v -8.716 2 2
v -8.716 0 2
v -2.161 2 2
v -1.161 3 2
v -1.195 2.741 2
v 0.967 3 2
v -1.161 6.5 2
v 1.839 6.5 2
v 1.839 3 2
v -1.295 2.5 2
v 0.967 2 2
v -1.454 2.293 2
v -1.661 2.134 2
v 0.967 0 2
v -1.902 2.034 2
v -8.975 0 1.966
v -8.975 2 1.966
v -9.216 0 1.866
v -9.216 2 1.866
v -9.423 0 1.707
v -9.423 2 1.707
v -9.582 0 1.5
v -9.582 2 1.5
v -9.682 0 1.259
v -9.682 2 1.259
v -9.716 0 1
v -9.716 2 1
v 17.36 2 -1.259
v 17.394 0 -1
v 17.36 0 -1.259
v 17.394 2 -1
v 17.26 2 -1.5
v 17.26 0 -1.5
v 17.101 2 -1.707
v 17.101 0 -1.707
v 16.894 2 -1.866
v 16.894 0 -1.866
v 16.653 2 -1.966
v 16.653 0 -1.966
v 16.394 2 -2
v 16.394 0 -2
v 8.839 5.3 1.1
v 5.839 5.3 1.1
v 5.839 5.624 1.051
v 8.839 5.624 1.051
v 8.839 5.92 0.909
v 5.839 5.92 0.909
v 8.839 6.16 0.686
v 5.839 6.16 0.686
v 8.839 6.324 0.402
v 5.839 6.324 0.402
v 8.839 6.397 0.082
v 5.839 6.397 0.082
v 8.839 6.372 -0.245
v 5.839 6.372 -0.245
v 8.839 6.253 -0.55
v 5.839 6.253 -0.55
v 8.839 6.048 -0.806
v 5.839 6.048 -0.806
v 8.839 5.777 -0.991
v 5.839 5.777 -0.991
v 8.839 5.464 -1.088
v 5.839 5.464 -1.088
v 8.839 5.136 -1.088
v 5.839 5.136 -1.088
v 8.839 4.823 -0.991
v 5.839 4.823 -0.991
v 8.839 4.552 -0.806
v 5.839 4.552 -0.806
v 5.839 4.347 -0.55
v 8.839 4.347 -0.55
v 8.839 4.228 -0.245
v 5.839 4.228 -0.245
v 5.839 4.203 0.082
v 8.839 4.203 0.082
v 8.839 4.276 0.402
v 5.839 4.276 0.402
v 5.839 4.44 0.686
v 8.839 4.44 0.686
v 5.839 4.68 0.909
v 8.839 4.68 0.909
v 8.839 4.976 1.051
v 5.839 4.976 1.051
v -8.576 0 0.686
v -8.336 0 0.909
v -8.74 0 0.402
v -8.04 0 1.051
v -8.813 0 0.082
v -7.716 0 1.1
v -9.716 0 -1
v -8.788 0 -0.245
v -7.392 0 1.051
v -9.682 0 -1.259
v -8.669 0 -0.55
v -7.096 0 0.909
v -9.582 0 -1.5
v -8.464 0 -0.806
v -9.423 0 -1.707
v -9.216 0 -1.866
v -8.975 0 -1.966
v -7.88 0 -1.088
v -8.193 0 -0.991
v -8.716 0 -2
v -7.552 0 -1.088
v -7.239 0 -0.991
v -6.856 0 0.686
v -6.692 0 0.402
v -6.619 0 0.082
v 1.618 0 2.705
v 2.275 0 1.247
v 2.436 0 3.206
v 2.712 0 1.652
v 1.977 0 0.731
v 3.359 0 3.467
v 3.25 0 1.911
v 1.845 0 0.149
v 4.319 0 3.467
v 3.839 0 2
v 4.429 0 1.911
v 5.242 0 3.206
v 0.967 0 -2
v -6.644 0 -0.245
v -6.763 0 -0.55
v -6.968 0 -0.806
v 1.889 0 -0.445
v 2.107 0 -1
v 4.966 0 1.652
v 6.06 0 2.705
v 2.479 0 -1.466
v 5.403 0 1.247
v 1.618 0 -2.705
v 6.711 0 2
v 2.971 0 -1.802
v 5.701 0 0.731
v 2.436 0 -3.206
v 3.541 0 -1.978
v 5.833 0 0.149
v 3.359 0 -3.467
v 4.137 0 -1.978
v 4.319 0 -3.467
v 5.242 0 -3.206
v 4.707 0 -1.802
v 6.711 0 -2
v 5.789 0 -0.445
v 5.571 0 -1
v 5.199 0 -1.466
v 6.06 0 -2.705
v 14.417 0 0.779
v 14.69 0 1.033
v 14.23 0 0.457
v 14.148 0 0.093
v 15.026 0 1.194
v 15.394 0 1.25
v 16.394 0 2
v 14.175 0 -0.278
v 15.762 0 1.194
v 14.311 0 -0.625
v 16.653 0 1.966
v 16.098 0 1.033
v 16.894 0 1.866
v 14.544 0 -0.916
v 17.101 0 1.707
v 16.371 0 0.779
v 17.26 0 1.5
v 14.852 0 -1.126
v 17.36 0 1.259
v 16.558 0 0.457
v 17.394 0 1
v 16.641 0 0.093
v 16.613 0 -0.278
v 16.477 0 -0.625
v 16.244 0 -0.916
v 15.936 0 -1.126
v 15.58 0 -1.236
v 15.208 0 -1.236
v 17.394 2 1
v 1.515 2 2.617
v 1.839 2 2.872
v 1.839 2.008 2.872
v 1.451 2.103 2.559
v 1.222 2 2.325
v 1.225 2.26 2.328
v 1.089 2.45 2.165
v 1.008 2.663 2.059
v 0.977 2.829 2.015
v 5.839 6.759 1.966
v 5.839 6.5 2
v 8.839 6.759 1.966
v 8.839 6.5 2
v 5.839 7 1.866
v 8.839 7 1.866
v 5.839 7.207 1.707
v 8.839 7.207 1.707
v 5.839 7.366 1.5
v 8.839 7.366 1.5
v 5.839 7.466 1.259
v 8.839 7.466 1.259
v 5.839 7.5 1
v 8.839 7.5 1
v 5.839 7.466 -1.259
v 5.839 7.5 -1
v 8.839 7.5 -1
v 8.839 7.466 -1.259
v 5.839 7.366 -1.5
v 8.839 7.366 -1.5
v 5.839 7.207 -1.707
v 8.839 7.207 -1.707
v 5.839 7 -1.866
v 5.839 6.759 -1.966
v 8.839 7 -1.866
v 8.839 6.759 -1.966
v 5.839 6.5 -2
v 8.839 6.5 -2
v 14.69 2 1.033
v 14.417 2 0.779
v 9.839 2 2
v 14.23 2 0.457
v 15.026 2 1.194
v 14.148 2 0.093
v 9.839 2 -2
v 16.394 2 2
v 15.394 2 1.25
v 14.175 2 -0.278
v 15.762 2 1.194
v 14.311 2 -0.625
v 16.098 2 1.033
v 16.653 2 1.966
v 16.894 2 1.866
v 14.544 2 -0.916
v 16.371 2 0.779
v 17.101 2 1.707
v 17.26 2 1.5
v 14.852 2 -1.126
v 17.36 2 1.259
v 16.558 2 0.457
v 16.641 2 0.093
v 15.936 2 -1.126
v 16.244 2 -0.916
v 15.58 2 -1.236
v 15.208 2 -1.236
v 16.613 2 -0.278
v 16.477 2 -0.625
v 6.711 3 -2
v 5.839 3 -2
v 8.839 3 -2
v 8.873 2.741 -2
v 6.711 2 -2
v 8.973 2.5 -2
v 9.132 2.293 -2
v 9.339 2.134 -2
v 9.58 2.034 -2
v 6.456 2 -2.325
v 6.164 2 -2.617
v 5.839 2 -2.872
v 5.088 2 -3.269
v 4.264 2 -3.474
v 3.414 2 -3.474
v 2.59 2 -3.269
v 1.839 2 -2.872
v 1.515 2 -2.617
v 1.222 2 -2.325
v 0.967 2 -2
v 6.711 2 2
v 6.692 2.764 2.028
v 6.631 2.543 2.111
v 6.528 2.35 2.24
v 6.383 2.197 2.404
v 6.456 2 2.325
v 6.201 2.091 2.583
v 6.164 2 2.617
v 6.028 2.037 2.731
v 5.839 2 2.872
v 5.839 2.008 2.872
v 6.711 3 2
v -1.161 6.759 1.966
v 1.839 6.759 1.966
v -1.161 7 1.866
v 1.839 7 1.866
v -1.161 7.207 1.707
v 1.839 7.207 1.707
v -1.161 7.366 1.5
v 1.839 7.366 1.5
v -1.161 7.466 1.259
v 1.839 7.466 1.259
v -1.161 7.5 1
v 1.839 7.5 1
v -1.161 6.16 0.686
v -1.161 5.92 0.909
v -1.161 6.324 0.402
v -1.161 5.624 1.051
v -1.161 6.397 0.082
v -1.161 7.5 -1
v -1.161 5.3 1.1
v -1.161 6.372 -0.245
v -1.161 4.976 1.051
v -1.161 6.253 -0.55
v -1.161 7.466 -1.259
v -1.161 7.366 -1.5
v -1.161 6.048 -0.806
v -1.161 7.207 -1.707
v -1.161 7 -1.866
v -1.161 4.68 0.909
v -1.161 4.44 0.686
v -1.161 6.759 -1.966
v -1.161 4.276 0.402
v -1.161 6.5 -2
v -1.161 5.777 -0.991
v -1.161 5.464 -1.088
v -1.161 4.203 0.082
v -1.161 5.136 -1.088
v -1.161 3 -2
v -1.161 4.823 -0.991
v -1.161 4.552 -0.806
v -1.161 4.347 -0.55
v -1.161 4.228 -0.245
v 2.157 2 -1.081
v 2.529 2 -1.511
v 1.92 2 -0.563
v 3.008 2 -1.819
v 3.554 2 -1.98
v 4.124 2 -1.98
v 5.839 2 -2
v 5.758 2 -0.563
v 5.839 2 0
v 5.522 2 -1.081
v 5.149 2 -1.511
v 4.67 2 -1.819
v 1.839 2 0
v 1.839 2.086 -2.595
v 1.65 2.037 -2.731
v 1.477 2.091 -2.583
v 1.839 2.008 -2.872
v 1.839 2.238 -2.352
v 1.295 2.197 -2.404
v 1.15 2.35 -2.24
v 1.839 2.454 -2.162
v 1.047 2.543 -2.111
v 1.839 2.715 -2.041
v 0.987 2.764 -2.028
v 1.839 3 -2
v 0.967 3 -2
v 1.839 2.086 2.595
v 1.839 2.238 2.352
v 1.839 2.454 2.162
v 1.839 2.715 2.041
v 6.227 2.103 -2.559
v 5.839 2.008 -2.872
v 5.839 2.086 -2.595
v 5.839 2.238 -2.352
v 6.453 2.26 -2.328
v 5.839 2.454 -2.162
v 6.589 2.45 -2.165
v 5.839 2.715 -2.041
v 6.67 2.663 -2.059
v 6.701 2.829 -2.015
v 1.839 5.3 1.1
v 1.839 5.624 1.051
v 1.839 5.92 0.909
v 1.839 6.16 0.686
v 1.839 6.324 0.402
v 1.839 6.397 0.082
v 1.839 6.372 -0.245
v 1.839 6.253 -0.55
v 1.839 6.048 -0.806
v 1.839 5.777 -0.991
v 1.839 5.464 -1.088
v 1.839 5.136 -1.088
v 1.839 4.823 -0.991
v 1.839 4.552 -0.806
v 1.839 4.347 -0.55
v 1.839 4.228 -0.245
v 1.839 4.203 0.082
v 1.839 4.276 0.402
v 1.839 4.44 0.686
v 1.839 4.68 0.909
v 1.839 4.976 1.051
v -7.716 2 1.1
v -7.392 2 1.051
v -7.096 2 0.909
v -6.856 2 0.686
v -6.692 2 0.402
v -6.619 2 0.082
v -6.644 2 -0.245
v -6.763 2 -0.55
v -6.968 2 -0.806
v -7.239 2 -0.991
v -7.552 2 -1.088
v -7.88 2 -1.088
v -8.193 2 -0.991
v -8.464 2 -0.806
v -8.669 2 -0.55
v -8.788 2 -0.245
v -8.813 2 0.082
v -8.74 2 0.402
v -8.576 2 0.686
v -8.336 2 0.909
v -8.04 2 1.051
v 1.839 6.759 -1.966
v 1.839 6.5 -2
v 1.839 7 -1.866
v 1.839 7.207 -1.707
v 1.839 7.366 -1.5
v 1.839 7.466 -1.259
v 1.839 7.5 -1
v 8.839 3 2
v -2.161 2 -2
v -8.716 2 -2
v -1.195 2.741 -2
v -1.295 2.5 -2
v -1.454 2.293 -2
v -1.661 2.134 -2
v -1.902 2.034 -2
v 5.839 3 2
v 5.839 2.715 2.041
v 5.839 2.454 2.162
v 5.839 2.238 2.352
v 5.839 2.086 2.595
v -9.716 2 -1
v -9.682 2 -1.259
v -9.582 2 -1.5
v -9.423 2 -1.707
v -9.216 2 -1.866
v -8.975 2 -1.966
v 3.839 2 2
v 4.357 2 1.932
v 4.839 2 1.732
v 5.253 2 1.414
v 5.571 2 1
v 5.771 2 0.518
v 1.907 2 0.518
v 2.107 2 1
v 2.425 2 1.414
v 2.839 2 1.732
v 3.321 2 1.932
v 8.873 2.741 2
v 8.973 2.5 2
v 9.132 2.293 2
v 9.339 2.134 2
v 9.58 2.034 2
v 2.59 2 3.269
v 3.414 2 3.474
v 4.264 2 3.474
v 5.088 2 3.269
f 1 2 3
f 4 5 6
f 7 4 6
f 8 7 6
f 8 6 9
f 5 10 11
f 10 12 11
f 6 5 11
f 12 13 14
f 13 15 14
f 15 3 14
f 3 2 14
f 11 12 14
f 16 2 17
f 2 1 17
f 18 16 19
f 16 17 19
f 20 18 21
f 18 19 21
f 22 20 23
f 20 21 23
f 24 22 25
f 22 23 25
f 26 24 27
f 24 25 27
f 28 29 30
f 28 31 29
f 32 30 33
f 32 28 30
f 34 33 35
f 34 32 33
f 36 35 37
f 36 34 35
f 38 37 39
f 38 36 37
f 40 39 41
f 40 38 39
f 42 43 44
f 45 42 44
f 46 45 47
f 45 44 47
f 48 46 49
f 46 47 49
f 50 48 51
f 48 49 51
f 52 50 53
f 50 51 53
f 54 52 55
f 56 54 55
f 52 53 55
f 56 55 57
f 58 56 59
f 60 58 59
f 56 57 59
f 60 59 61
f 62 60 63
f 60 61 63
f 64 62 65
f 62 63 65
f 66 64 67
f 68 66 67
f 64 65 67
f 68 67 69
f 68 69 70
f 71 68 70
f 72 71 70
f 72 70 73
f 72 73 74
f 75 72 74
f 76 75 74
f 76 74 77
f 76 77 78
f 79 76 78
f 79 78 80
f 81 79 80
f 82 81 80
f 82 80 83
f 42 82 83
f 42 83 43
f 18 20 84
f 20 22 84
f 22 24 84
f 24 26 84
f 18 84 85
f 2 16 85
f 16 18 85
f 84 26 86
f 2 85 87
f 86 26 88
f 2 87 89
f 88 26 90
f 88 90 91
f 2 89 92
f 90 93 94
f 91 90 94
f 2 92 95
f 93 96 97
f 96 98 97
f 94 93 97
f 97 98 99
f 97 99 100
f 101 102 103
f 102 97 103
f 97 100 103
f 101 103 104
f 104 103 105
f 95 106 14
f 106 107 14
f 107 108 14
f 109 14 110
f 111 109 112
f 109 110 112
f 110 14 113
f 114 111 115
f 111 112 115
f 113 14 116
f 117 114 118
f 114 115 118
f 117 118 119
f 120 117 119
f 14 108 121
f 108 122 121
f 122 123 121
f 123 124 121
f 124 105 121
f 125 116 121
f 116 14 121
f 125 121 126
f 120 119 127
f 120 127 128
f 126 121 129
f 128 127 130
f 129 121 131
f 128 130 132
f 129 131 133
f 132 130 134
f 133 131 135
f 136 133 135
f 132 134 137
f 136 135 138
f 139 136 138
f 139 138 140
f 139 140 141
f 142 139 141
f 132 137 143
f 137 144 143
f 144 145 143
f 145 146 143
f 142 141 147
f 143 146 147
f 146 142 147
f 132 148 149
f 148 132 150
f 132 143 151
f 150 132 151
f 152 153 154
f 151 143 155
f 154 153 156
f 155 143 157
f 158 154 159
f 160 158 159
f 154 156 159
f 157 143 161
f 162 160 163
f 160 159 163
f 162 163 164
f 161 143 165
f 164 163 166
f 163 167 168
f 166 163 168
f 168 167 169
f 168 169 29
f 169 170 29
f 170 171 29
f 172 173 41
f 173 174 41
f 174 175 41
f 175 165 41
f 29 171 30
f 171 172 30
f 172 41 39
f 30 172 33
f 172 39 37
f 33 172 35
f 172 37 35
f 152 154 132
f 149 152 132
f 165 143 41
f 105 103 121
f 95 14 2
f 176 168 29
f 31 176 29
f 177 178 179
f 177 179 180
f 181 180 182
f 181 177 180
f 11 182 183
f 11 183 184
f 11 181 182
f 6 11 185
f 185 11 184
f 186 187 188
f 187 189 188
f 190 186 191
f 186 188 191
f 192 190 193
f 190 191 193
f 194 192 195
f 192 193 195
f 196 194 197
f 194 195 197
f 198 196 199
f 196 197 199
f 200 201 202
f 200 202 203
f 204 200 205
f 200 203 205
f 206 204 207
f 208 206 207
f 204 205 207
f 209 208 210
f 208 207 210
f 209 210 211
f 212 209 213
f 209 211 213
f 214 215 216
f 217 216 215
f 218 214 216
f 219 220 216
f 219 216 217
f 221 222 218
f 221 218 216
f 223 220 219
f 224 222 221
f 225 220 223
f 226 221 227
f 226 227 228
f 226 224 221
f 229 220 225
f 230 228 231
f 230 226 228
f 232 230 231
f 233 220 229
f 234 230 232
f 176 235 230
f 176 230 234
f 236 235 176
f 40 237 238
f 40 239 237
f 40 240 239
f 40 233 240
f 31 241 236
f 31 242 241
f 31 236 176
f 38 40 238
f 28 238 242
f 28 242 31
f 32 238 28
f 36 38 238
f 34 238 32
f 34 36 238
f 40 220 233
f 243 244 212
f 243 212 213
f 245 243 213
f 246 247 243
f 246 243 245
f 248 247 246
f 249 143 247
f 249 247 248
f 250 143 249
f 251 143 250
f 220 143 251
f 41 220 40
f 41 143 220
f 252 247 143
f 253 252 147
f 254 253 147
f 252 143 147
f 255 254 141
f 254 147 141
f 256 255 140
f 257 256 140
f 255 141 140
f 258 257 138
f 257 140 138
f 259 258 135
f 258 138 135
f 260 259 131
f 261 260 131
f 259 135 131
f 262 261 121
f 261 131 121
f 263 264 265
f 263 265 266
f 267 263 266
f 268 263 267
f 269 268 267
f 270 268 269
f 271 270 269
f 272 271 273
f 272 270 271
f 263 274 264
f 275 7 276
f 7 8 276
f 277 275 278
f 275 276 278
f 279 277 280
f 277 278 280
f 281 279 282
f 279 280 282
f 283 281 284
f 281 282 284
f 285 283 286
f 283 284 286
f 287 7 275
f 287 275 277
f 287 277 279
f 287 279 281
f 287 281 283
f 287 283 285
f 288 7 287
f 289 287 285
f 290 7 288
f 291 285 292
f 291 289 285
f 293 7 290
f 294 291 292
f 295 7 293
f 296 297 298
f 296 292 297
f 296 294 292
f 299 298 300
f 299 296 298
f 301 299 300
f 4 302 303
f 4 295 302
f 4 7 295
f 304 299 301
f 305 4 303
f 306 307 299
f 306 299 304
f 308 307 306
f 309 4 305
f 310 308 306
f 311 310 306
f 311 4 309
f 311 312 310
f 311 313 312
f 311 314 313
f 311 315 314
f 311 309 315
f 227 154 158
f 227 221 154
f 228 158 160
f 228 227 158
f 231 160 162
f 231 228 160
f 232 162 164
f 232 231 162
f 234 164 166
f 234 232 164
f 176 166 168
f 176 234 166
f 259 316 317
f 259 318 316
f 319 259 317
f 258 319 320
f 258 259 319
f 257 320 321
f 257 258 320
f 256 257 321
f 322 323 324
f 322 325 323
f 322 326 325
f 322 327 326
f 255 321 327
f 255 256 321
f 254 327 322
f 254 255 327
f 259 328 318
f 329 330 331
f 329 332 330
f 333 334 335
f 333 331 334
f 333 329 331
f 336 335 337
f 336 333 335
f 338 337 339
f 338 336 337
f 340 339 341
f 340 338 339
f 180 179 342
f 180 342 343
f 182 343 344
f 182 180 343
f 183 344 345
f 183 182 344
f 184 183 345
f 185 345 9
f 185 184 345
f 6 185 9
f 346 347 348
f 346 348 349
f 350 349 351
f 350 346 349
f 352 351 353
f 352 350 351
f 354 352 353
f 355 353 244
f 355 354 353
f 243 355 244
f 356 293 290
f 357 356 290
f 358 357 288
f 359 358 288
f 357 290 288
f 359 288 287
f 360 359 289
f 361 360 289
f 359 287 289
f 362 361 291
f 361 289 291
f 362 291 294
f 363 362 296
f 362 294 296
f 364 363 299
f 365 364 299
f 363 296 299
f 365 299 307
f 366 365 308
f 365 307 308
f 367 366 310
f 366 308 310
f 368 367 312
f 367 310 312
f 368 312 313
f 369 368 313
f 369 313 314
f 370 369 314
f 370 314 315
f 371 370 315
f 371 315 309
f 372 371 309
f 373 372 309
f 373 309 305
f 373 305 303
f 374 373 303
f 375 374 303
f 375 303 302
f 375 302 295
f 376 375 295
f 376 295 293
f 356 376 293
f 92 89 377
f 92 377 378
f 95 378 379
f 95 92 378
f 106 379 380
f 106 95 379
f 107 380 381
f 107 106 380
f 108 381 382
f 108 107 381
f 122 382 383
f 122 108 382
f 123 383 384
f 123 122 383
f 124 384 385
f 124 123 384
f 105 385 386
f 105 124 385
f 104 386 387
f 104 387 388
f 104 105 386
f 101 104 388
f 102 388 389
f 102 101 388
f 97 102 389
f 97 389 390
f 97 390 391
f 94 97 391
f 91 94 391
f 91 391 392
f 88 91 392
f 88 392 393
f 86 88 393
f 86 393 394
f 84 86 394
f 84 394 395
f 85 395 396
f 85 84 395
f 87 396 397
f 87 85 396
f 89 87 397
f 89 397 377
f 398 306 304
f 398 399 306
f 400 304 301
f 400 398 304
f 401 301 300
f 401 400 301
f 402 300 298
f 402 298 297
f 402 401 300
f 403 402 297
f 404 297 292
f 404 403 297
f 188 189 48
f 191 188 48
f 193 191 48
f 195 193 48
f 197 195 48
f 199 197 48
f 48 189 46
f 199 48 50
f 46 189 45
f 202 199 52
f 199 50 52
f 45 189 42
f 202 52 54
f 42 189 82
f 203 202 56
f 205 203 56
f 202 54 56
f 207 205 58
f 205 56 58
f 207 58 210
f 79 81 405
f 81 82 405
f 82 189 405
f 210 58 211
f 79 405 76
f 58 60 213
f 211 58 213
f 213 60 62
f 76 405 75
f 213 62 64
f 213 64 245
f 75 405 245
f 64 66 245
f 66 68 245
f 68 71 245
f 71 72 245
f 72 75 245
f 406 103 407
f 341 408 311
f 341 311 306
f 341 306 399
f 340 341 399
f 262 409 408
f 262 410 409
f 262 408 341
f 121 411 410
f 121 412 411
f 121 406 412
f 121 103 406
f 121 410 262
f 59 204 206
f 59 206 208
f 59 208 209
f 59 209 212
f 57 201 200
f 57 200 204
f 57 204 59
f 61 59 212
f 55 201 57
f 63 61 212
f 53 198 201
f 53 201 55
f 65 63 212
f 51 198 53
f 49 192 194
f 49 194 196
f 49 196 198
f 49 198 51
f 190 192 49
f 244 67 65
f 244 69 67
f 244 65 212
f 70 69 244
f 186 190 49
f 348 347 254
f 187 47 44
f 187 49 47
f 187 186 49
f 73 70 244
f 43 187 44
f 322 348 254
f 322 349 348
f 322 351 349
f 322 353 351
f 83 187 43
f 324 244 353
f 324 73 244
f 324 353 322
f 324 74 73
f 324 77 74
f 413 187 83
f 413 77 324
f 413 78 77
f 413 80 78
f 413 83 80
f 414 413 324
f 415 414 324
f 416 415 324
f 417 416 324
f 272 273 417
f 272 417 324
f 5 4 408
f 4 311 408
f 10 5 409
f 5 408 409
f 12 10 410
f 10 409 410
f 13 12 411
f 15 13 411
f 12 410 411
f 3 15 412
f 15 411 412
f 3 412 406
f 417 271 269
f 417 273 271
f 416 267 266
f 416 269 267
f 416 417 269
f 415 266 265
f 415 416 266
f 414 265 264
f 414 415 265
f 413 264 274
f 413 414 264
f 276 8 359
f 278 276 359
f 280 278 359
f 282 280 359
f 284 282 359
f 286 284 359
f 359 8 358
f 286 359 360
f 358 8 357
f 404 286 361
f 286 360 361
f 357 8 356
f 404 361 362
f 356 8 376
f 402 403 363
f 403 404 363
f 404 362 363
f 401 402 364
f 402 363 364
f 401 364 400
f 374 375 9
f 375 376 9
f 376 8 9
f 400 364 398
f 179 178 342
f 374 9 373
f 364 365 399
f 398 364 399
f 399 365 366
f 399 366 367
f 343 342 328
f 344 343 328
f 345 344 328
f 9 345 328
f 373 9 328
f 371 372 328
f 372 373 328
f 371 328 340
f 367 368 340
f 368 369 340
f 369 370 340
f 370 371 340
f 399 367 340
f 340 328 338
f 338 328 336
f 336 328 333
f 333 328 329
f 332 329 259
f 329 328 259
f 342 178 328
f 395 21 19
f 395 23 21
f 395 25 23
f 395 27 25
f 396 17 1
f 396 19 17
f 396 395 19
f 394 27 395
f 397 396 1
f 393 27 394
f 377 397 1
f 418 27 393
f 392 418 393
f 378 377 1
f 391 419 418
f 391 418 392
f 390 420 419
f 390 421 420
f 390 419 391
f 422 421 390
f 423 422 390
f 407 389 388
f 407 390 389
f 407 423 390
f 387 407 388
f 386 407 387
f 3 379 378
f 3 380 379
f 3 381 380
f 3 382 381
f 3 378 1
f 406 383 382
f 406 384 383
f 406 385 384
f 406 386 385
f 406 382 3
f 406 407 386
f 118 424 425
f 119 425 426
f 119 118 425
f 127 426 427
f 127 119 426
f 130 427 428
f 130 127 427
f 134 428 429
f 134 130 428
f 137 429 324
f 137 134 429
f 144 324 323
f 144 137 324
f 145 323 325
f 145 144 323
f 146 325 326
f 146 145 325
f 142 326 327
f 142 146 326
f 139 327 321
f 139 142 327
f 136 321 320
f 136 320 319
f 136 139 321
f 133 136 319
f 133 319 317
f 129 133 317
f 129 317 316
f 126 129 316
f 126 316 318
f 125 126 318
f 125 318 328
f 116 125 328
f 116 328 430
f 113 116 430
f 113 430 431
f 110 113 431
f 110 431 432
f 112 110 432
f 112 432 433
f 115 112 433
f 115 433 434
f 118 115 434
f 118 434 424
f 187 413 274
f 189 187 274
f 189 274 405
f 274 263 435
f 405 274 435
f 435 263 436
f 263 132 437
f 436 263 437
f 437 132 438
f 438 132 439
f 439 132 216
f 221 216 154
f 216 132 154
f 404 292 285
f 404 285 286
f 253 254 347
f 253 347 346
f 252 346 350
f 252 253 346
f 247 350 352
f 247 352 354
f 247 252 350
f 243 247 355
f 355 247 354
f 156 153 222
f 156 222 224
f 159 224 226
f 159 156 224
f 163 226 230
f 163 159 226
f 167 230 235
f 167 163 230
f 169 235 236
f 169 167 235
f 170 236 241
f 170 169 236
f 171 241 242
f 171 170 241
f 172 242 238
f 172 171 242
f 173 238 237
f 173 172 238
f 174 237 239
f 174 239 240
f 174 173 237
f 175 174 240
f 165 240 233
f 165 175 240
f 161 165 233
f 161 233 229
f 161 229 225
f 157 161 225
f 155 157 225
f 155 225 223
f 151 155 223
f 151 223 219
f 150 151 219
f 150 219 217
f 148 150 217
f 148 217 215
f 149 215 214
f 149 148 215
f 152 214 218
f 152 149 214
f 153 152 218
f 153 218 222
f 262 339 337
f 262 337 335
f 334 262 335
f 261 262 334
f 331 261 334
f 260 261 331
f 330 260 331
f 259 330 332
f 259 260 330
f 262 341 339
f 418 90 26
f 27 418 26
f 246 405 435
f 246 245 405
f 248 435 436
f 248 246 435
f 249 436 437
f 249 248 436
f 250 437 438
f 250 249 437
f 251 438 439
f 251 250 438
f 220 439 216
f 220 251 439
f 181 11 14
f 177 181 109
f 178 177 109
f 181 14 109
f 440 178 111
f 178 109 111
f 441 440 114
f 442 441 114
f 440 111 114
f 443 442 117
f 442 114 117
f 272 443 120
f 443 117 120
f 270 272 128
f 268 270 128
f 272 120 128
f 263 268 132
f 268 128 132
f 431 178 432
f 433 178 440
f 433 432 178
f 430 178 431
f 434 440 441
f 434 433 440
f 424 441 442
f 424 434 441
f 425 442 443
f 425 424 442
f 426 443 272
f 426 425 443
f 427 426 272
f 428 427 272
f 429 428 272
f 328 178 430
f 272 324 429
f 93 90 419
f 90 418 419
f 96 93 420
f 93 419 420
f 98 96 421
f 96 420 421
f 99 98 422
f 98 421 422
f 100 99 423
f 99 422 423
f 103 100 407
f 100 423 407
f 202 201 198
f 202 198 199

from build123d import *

# Parameters (mm, degrees)
SKETCH_1_R          = 2
SKETCH_1_R_2        = 1.25
SKETCH_1_R_3        = 1.1
EXTRUDE_1_DEPTH     = 2
SKETCH_2_W          = 3
SKETCH_2_H          = 4
EXTRUDE_2_DEPTH     = 5.5
SKETCH_4_R          = 1.1
CUT_EXTRUDE_1_DEPTH = 11
FILLET_2_R          = 1
FILLET_3_R          = 1
FILLET_4_R          = 1
FILLET_5_R          = 1


with BuildPart() as part:
    # 草图1 → 凸台-拉伸1 (new body)
    with BuildSketch(Plane(origin=(0, 0, 0), x_dir=(1, 0, 0), z_dir=(0, 1, 0))):
        with BuildLine():
            Line((6.711295009, -2), (17.394013685, -2))
            Line((17.394013685, -2), (17.394013685, 2))
            Line((17.394013685, 2), (6.711295009, 2))
            ThreePointArc((6.711295009, 2), (3.839013685, 3.5), (0.966732362, 2))
            Line((0.966732362, 2), (-9.715986315, 2))
            Line((-9.715986315, 2), (-9.715986315, -2))
            Line((-9.715986315, -2), (0.966732362, -2))
            ThreePointArc((0.966732362, -2), (3.839013685, -3.5), (6.711295009, -2))
        make_face()
        with Locations(Location((3.839013685, 0, 0), (0, 0, 270))):
            Circle(SKETCH_1_R, mode=Mode.SUBTRACT)
        with Locations(Location((15.394013685, 0, 0), (0, 0, 270))):
            Circle(SKETCH_1_R_2, mode=Mode.SUBTRACT)
        with Locations(Location((-7.715986315, 0, 0), (0, 0, 270))):
            Circle(SKETCH_1_R_3, mode=Mode.SUBTRACT)
    extrude(amount=EXTRUDE_1_DEPTH)

    # 草图2 → 凸台-拉伸2 (add)
    with BuildSketch(Plane(origin=(0, 2, 0), x_dir=(1, 0, 0), z_dir=(0, 1, 0))):
        with Locations((7.339013685, 0)):
            Rectangle(SKETCH_2_W, SKETCH_2_H)
        with Locations((0.339013685, 0)):
            Rectangle(SKETCH_2_W, SKETCH_2_H)
    extrude(amount=EXTRUDE_2_DEPTH)

    # 草图4 → 切除-拉伸1 (cut)
    with BuildSketch(Plane.ZY.offset(1.160986315)):
        with Locations((0, 5.3)):
            Circle(SKETCH_4_R)
    extrude(amount=-CUT_EXTRUDE_1_DEPTH, mode=Mode.SUBTRACT)

    # 圆角2
    fillet_2_edges = [part.edges().sort_by_distance(p)[0] for p in [
        (0.339013685, 7.5, -2),
        (0.339013685, 7.5, 2),
        (7.339013685, 7.5, -2),
        (7.339013685, 7.5, 2),
    ]]
    fillet(fillet_2_edges, radius=FILLET_2_R)

    # 圆角3
    fillet_3_edges = [part.edges().sort_by_distance(p)[0] for p in [
        (-1.160986315, 2, 0),
        (8.839013685, 2, 0),
    ]]
    fillet(fillet_3_edges, radius=FILLET_3_R)

    # 圆角4
    fillet_4_edges = [part.edges().sort_by_distance(p)[0] for p in [
        (-9.715986315, 1, 2),
        (-9.715986315, 1, -2),
        (17.394013685, 1, -2),
        (17.394013685, 1, 2),
    ]]
    fillet(fillet_4_edges, radius=FILLET_4_R)

    # 圆角5
    # the kernel refuses this fillet: 1 mm, written as the material it adds along each edge
    with BuildSketch(Plane(origin=(9.211295009, 2, -2), x_dir=(0, 1, 0), z_dir=(-1, 0, 0))) as fillet_5_piece_1_section:
        with BuildLine():
            CenterArc((FILLET_5_R, FILLET_5_R), FILLET_5_R, 180, 90)
            Line((0, FILLET_5_R), (0, 0))
            Line((0, 0), (FILLET_5_R, 0))
        make_face()
    fillet_5_piece_1 = extrude(amount=3.372281323, mode=Mode.PRIVATE)
    fillet_5_piece_1 = fillet_5_piece_1 & Plane(origin=(3.839013685, 2.261416354, 0), x_dir=(0.820651806648311, 0, -0.571428571428541), z_dir=(0, -1, 0)) * Cylinder(3.5, 11, mode=Mode.PRIVATE)
    add(fillet_5_piece_1)
    with BuildSketch(Plane(origin=(1.839013685, 2, -2), x_dir=(0, 1, 0), z_dir=(-1, 0, 0))) as fillet_5_piece_2_section:
        with BuildLine():
            CenterArc((FILLET_5_R, FILLET_5_R), FILLET_5_R, 180, 90)
            Line((0, FILLET_5_R), (0, 0))
            Line((0, 0), (FILLET_5_R, 0))
        make_face()
    fillet_5_piece_2 = extrude(amount=3.372281323, mode=Mode.PRIVATE)
    fillet_5_piece_2 = fillet_5_piece_2 & Plane(origin=(3.839013685, 2.261416398, 0), x_dir=(0.820651806648311, 0, -0.571428571428541), z_dir=(0, -1, 0)) * Cylinder(3.5, 11, mode=Mode.PRIVATE)
    add(fillet_5_piece_2)
    with BuildSketch(Plane(origin=(-1.533267638, 2, 2), x_dir=(0, 0, 1), z_dir=(1, 0, 0))) as fillet_5_piece_3_section:
        with BuildLine():
            CenterArc((FILLET_5_R, -FILLET_5_R), FILLET_5_R, 90, 90)
            Line((0, -FILLET_5_R), (0, 0))
            Line((0, 0), (FILLET_5_R, 0))
        make_face()
    fillet_5_piece_3 = extrude(amount=3.372281323, mode=Mode.PRIVATE)
    fillet_5_piece_3 = fillet_5_piece_3 & Plane(origin=(3.839013685, 2.26141635, 0), x_dir=(-0.8206518066482962, 0, 0.5714285714285624), z_dir=(0, -1, 0)) * Cylinder(3.5, 11, mode=Mode.PRIVATE)
    add(fillet_5_piece_3)
    with BuildSketch(Plane(origin=(5.839013685, 2, 2), x_dir=(0, 1, 0), z_dir=(1, 0, 0))) as fillet_5_piece_4_section:
        with BuildLine():
            CenterArc((FILLET_5_R, FILLET_5_R), FILLET_5_R, 180, 90)
            Line((0, FILLET_5_R), (0, 0))
            Line((0, 0), (FILLET_5_R, 0))
        make_face()
    fillet_5_piece_4 = extrude(amount=3.372281323, mode=Mode.PRIVATE)
    fillet_5_piece_4 = fillet_5_piece_4 & Plane(origin=(3.839013685, 2.261416398, 0), x_dir=(-0.8206518066482962, 0, 0.5714285714285624), z_dir=(0, -1, 0)) * Cylinder(3.5, 11, mode=Mode.PRIVATE)
    add(fillet_5_piece_4)


solid = part.part
